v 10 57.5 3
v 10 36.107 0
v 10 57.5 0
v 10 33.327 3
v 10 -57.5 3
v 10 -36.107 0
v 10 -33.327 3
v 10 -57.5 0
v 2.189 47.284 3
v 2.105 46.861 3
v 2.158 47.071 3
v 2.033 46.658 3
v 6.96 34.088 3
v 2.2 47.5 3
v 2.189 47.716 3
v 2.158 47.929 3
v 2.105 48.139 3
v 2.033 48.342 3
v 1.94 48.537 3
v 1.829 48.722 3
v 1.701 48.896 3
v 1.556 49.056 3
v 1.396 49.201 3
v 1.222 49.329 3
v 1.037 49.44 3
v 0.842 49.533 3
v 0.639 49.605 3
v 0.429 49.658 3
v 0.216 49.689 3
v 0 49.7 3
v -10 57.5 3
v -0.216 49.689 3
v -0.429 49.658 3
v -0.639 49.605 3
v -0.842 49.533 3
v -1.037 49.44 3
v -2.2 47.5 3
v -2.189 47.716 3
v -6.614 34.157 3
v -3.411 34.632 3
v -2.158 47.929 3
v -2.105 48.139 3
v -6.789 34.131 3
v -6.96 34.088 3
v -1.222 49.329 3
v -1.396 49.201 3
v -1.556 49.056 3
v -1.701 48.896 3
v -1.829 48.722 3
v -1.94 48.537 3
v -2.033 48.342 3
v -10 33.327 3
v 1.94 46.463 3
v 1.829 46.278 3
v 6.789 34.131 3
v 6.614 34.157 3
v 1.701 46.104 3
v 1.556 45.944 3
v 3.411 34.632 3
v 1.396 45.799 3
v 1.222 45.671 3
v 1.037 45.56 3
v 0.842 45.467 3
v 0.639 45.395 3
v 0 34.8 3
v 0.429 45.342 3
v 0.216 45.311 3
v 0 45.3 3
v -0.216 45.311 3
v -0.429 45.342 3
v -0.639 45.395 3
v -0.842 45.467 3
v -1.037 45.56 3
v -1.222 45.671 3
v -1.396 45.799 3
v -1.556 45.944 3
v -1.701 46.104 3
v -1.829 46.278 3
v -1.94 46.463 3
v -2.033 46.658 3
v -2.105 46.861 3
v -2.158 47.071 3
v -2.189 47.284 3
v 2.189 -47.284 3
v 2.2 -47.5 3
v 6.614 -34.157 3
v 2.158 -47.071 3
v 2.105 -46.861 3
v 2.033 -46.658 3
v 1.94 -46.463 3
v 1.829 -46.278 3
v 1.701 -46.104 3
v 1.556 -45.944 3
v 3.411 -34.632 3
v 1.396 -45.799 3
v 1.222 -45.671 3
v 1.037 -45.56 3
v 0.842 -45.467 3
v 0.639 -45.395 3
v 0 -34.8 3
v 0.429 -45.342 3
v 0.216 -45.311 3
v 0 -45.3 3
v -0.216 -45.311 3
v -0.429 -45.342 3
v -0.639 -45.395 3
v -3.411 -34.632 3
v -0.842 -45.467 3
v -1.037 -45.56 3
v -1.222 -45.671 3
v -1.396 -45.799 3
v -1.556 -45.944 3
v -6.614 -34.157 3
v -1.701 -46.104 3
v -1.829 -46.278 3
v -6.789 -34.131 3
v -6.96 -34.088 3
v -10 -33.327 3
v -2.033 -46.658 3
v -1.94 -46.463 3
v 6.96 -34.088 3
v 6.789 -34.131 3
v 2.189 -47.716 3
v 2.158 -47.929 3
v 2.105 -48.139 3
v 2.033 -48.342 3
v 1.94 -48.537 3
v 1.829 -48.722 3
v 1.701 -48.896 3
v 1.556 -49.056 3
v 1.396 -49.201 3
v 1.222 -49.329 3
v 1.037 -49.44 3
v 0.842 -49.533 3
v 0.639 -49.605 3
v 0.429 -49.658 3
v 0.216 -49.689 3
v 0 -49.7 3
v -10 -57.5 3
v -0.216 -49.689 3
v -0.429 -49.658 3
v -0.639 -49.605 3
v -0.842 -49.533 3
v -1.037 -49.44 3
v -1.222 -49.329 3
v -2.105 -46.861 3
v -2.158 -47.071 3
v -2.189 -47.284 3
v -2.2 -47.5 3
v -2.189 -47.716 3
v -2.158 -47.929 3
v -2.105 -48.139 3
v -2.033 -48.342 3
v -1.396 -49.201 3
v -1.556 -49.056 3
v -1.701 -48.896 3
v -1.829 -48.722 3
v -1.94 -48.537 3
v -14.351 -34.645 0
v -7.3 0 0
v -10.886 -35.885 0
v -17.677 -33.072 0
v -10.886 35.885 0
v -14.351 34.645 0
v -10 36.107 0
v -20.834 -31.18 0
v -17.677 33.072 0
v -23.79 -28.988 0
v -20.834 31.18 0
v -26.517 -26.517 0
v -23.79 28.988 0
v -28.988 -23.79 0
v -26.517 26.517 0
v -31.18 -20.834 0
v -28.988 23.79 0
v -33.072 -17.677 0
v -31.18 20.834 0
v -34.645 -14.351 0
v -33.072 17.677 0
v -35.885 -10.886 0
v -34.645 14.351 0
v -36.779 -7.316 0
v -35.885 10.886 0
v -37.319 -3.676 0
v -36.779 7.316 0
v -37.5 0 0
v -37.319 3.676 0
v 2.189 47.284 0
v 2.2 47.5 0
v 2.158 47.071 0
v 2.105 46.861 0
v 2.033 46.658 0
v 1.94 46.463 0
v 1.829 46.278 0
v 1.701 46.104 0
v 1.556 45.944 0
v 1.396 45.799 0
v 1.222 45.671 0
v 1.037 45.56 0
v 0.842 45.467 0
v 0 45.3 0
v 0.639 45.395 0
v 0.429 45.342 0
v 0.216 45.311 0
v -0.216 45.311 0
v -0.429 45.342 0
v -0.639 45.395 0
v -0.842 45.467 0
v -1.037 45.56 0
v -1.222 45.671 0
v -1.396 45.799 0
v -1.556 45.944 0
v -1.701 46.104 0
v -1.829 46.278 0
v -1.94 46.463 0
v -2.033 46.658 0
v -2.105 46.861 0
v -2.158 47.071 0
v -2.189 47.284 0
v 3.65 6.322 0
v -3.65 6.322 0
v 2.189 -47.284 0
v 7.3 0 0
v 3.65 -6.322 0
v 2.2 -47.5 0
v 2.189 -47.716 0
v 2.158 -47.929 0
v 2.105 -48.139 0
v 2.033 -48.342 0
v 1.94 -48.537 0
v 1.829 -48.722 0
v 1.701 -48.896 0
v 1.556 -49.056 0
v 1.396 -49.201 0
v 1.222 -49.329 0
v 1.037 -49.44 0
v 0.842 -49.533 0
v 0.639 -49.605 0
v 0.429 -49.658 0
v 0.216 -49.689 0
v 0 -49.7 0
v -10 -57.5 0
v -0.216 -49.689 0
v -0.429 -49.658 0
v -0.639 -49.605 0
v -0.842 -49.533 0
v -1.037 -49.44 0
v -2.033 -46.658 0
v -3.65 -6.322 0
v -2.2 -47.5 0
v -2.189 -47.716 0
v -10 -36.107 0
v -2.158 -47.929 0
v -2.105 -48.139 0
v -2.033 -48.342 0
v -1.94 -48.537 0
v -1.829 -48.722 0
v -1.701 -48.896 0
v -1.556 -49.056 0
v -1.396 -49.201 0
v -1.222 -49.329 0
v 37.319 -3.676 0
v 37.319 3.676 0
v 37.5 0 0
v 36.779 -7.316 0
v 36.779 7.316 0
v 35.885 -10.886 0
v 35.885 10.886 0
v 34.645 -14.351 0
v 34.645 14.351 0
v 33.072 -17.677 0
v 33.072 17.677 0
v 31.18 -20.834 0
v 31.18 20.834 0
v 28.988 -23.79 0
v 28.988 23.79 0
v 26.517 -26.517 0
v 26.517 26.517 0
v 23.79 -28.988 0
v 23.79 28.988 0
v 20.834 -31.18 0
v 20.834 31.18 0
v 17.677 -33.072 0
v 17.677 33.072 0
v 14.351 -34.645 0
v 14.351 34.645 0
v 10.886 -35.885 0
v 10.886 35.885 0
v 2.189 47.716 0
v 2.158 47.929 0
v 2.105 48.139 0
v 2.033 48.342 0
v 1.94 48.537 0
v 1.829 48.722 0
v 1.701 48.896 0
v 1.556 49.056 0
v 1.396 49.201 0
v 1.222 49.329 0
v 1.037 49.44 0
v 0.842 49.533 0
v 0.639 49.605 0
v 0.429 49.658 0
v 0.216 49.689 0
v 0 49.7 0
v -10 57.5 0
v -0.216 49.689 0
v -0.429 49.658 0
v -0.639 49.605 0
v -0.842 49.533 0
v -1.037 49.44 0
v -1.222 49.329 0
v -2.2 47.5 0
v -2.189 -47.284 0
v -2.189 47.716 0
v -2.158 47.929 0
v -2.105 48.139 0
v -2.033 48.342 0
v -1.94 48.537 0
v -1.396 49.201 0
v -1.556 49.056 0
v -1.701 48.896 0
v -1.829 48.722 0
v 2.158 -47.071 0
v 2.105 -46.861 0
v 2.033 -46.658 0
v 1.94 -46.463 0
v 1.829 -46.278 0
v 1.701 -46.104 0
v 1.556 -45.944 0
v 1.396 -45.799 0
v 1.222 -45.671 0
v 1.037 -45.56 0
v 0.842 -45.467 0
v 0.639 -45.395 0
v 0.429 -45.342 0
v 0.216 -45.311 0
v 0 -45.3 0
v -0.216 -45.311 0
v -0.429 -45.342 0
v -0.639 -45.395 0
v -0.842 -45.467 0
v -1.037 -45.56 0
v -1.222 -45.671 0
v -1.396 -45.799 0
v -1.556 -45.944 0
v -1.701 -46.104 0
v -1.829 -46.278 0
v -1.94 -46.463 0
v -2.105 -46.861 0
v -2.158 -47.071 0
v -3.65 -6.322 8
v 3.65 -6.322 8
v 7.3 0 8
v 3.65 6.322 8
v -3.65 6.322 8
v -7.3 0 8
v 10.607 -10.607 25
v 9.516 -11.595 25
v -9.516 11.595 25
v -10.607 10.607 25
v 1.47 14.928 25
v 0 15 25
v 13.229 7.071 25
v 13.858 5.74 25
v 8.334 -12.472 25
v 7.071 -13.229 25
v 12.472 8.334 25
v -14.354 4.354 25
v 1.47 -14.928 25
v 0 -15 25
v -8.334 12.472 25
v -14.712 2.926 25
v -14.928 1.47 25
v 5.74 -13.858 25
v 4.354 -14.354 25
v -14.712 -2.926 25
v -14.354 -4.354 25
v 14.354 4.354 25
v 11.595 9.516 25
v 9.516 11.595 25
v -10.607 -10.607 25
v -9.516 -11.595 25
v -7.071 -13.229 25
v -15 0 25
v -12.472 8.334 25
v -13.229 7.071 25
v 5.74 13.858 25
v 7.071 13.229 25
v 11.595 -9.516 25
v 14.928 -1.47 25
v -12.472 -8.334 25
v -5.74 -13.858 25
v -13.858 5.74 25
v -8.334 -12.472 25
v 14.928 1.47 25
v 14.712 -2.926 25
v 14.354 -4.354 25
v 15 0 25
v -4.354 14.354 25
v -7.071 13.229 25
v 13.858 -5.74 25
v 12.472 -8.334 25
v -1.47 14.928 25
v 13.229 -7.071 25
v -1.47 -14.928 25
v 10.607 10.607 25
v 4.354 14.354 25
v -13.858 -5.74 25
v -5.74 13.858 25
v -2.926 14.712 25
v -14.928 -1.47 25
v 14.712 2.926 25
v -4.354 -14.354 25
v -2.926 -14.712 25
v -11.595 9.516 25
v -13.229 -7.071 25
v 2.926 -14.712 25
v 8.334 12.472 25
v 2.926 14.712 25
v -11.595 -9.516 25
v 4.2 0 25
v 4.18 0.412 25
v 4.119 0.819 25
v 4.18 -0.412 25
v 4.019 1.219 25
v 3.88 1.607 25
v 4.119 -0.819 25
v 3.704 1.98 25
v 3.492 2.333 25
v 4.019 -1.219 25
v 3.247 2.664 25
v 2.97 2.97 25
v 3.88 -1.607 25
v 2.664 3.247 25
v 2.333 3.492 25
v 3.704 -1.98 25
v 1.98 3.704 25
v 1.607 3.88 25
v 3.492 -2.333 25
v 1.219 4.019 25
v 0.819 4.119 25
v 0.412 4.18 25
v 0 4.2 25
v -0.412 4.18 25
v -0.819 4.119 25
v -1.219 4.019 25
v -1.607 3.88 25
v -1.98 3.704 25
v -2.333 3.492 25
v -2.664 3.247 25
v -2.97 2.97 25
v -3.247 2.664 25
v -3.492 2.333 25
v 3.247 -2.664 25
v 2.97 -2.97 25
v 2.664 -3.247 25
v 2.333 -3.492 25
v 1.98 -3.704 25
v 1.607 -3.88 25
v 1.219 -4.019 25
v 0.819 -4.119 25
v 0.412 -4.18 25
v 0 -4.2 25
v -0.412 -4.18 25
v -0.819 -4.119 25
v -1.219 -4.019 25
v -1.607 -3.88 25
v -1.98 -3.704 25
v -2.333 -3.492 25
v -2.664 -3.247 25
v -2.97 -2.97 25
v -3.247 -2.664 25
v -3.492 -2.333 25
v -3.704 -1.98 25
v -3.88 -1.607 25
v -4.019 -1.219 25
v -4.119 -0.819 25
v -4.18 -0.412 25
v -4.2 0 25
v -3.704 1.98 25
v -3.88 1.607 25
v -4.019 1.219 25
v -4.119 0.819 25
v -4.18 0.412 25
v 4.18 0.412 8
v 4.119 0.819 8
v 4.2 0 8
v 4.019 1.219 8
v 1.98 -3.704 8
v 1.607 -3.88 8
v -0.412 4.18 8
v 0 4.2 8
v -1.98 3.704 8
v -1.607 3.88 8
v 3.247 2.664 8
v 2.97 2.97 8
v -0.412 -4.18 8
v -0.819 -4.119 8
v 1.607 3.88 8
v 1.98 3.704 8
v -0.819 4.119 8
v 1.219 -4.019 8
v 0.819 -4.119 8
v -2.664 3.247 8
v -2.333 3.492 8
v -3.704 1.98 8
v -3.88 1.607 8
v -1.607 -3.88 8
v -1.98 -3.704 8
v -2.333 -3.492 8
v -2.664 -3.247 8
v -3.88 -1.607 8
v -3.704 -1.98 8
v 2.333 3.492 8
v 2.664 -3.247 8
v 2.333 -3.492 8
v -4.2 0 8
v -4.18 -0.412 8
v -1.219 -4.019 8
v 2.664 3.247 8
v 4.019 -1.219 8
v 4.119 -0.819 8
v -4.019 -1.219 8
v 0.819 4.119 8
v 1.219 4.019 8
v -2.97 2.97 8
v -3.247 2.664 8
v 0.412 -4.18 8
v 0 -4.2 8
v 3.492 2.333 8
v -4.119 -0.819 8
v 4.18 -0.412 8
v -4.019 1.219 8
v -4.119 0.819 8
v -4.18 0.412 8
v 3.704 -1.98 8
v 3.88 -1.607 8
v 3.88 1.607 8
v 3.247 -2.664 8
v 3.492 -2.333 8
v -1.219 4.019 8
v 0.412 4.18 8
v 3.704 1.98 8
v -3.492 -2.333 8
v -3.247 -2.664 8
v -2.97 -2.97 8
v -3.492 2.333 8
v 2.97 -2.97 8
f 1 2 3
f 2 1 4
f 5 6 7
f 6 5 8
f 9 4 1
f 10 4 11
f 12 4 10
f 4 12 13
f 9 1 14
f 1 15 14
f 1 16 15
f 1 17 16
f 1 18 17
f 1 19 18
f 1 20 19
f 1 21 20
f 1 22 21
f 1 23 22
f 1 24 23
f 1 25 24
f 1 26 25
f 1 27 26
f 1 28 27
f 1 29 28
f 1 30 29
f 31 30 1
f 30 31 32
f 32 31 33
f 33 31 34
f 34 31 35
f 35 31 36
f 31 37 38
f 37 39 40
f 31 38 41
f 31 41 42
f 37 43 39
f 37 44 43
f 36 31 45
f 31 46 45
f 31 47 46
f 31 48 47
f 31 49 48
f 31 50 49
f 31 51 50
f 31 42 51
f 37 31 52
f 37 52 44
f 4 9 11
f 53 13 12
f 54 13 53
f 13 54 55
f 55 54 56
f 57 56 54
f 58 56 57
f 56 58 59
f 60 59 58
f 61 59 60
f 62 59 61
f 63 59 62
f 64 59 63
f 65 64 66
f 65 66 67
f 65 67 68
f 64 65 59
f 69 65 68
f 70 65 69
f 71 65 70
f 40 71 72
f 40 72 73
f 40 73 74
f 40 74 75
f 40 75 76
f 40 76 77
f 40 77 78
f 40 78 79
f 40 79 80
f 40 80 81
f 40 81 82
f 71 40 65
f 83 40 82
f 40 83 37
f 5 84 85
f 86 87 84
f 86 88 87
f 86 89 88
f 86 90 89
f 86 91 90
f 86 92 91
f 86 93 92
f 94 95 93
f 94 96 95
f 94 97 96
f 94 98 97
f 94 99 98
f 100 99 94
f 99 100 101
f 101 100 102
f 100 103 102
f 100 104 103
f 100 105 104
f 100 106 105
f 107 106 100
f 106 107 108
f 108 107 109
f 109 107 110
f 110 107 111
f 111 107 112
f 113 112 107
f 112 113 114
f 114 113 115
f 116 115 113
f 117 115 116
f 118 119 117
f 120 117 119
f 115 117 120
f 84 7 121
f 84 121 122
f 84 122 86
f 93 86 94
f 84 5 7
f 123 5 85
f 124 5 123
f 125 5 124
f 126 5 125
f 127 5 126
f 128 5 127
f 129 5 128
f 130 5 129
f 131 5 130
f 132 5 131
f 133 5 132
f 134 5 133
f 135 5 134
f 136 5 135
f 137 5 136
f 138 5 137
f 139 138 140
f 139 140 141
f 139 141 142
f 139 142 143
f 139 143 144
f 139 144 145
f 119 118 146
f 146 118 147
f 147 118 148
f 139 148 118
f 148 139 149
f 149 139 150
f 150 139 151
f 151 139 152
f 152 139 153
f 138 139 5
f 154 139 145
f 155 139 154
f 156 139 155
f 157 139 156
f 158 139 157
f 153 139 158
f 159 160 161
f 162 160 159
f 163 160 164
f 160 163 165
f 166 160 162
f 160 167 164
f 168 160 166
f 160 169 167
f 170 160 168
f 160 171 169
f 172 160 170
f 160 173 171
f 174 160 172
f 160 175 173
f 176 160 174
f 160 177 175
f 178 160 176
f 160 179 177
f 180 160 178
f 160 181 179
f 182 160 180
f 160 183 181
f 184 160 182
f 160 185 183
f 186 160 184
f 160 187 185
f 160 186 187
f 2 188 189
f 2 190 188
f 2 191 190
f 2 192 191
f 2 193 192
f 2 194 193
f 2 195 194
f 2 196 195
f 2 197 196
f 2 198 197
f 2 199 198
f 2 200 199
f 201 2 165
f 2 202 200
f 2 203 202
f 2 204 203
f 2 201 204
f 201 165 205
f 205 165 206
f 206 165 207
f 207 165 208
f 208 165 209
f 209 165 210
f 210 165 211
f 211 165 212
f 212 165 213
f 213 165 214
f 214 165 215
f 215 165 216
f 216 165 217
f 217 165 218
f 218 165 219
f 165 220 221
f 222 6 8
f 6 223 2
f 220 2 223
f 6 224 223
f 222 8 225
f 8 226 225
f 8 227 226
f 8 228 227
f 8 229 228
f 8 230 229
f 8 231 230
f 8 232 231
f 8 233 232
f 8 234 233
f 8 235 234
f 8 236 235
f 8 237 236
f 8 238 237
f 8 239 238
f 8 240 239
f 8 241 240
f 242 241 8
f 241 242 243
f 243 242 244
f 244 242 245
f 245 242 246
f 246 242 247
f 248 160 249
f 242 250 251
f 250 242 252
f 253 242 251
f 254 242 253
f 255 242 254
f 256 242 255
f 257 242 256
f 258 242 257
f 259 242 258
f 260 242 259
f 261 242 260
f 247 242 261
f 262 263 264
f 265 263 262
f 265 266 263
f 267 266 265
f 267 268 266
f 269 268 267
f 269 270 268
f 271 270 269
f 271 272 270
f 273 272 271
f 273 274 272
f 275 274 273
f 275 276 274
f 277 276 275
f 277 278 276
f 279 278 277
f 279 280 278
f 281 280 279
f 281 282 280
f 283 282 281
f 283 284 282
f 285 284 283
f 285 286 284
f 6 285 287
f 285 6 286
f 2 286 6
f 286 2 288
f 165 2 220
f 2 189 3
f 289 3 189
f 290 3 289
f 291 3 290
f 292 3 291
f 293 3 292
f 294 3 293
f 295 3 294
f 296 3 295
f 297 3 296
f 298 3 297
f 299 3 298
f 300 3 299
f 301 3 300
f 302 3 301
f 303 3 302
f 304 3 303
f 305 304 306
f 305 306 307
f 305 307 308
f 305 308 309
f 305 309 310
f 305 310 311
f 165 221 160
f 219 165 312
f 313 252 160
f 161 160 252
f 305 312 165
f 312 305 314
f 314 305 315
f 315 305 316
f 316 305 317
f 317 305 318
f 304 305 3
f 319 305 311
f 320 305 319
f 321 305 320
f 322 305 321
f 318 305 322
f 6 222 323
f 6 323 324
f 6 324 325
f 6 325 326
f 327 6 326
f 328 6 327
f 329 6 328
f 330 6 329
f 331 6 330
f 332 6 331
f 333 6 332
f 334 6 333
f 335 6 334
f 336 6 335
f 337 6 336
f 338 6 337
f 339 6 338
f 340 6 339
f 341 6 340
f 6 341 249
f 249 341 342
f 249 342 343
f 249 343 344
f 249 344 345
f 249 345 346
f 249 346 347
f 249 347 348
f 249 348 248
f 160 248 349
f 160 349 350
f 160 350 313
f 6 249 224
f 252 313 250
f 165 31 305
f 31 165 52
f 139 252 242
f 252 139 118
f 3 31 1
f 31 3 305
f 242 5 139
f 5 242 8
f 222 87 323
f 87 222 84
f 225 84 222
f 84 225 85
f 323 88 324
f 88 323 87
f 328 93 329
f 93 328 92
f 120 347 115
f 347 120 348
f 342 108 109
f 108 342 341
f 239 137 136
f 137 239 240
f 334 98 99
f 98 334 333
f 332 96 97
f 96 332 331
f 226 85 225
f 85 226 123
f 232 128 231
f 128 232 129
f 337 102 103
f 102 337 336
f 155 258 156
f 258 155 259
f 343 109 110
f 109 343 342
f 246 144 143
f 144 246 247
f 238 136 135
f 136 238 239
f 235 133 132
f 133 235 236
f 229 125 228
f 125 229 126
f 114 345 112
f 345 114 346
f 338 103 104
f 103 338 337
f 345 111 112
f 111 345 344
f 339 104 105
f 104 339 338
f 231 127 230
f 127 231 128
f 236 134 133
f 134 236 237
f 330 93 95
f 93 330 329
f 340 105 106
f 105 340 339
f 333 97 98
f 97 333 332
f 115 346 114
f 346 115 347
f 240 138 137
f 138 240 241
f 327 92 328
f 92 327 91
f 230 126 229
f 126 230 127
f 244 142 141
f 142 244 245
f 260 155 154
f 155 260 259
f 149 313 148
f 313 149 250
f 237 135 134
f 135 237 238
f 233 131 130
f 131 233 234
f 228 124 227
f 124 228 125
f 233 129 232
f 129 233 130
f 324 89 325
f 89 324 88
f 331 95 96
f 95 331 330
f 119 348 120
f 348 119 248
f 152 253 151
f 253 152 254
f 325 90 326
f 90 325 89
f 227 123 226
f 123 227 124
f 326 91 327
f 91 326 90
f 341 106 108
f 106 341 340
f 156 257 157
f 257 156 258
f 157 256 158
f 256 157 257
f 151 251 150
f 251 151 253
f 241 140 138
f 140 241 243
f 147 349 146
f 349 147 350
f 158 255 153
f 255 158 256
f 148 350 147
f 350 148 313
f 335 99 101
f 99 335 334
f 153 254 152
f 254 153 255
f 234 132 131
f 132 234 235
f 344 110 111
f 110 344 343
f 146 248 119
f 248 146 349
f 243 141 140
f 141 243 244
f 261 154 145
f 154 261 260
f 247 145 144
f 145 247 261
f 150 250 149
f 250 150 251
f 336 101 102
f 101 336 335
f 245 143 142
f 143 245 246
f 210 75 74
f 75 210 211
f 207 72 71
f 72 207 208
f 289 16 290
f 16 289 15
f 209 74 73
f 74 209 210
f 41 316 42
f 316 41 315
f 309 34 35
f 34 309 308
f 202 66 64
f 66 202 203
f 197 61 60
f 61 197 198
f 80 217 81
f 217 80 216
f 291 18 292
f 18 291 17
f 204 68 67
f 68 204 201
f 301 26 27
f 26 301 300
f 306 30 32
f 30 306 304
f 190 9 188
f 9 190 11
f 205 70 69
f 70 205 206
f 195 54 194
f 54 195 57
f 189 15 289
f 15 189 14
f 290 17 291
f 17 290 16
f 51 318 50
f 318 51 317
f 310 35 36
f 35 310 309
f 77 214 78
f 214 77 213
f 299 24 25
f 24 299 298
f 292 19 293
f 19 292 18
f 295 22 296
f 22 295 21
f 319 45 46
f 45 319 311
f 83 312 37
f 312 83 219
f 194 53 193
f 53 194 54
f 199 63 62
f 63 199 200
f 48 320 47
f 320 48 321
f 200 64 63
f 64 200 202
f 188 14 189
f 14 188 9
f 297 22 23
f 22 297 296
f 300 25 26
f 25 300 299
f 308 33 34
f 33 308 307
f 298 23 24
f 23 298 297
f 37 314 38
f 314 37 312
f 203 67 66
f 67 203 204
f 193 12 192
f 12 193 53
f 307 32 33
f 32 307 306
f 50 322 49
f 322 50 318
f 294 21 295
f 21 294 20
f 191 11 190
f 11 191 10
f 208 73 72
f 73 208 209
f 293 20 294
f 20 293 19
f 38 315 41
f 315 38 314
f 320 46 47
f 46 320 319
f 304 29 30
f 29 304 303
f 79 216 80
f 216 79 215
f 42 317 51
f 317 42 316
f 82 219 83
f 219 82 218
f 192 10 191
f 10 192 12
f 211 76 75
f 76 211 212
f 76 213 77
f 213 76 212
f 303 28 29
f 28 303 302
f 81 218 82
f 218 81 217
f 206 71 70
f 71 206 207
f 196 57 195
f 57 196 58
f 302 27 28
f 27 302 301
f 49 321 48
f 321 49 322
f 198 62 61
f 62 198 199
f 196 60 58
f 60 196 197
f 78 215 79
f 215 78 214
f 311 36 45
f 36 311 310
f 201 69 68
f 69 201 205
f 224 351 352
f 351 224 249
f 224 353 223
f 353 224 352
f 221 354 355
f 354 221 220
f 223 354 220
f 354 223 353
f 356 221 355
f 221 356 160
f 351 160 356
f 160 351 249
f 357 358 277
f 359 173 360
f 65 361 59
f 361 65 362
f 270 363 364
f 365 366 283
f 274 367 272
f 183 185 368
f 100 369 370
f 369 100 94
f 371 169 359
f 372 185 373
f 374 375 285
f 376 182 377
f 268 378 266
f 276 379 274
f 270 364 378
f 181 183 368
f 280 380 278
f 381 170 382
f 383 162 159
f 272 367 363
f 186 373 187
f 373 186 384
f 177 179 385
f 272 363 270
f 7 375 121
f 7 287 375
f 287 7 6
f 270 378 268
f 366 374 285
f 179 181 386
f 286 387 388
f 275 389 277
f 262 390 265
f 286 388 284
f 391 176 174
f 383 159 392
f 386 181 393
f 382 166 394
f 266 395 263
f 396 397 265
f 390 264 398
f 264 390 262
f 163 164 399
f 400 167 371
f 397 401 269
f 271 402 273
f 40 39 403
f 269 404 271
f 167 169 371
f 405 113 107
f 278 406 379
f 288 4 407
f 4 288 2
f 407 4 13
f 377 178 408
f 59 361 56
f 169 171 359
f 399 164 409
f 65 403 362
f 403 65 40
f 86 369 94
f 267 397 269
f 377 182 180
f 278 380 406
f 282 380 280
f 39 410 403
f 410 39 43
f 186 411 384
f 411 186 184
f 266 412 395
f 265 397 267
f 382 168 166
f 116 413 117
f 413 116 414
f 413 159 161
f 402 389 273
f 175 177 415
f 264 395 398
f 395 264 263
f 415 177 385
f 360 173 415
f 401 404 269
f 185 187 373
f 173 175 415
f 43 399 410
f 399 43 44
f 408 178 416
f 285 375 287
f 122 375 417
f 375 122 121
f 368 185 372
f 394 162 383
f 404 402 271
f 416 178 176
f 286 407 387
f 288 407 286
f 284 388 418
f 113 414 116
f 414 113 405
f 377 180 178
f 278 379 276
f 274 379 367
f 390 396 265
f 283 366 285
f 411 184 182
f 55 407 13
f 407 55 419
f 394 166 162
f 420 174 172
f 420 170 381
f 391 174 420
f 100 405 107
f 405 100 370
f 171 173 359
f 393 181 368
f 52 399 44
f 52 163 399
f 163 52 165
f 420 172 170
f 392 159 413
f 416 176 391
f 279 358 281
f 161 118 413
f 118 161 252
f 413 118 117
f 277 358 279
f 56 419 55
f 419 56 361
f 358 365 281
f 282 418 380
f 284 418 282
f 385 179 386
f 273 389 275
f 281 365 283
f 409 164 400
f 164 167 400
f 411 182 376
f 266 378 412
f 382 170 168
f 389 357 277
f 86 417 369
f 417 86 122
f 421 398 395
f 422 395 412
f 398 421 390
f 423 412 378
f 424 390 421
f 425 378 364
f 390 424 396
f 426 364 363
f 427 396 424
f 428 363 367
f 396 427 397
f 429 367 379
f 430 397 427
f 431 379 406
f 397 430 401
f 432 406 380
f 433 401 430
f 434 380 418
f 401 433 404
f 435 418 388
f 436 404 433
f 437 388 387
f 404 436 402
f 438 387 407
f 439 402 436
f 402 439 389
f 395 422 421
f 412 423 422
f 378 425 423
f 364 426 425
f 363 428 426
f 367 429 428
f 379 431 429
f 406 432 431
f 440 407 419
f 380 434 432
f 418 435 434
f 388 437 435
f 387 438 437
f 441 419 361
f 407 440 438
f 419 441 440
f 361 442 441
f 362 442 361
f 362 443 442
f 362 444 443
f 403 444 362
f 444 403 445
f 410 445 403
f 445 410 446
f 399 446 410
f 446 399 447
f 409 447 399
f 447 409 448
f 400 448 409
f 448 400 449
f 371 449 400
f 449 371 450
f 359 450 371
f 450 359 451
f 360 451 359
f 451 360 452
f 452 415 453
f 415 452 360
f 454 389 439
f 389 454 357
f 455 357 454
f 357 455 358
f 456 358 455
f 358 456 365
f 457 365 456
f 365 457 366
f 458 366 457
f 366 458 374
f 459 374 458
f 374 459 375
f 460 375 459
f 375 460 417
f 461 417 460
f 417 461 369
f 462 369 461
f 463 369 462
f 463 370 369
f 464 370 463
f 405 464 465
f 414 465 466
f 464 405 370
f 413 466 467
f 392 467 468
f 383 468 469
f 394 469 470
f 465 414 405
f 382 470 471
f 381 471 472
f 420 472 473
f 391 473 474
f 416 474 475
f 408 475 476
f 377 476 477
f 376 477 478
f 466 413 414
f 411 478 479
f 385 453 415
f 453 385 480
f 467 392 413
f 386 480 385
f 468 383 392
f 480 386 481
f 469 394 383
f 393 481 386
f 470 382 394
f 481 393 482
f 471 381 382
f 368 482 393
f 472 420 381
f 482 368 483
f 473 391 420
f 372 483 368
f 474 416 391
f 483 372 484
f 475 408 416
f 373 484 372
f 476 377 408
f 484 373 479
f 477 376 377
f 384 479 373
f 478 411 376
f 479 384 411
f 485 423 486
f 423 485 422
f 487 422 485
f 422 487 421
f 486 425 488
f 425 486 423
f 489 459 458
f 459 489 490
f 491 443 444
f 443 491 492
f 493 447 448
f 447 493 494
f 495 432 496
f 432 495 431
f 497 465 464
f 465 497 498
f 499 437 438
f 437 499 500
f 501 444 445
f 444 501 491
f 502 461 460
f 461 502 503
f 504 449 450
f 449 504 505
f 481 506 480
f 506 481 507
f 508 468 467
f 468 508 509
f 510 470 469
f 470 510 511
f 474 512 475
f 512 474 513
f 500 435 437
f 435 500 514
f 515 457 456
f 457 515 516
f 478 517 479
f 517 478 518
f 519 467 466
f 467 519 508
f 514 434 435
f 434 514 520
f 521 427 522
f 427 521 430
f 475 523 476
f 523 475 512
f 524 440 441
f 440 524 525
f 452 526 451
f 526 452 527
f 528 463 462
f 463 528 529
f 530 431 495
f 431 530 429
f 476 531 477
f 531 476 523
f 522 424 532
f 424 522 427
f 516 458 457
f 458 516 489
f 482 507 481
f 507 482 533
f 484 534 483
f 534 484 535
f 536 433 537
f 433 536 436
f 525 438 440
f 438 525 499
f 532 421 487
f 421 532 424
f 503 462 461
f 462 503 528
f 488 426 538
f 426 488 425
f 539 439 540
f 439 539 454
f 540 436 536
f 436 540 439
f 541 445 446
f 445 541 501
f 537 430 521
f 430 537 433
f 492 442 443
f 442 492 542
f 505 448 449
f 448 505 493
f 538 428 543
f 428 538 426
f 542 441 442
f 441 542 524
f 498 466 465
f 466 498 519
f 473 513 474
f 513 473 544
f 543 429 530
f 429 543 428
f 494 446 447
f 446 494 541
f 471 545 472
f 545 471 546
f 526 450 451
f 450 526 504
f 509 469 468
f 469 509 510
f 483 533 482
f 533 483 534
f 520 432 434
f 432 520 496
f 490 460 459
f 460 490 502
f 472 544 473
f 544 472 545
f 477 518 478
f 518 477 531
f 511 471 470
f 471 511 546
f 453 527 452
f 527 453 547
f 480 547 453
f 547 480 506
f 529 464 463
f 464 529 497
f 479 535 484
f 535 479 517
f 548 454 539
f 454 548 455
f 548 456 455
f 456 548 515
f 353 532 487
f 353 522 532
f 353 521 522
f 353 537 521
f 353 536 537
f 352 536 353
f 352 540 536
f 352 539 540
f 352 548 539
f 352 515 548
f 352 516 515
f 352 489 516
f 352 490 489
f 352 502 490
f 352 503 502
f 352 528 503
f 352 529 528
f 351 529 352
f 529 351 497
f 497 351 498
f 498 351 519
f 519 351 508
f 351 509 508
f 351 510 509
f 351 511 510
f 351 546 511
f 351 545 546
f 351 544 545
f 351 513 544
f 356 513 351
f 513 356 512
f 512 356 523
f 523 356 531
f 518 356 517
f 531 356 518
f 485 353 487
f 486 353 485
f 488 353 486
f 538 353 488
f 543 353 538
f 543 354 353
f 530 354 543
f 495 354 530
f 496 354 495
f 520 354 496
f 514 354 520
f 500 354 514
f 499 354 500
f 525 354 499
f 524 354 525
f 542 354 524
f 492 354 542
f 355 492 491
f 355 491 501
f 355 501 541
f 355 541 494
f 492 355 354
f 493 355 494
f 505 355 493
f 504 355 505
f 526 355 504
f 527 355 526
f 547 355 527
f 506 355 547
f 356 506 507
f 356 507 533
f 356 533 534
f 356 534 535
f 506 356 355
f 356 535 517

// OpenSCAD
$fn=64;
module m8nut(){
//cylinder(r = 14 / 2 / cos(180 / 6) + 0.05, h=7, $fn=6);
cylinder(d=14.6,h=8,$fn=6);
}
module bar(){
difference(){
translate([-10,-57.5,0])
cube([20,115,3]);
translate([0,0,-1])
cylinder(h=30, d=8.4);

translate([0,-47.5,-1])
cylinder(h=5, d=4.4);
	translate([0,47.5,-1])
cylinder(h=5, d=4.4);
m8nut();
}
}
module clamp(){
difference(){
cylinder(h=25, d1=75, d2=30);
translate([0,0,-1])
cylinder(h=50, d=8.4);

m8nut();
}
}
bar();
clamp();
